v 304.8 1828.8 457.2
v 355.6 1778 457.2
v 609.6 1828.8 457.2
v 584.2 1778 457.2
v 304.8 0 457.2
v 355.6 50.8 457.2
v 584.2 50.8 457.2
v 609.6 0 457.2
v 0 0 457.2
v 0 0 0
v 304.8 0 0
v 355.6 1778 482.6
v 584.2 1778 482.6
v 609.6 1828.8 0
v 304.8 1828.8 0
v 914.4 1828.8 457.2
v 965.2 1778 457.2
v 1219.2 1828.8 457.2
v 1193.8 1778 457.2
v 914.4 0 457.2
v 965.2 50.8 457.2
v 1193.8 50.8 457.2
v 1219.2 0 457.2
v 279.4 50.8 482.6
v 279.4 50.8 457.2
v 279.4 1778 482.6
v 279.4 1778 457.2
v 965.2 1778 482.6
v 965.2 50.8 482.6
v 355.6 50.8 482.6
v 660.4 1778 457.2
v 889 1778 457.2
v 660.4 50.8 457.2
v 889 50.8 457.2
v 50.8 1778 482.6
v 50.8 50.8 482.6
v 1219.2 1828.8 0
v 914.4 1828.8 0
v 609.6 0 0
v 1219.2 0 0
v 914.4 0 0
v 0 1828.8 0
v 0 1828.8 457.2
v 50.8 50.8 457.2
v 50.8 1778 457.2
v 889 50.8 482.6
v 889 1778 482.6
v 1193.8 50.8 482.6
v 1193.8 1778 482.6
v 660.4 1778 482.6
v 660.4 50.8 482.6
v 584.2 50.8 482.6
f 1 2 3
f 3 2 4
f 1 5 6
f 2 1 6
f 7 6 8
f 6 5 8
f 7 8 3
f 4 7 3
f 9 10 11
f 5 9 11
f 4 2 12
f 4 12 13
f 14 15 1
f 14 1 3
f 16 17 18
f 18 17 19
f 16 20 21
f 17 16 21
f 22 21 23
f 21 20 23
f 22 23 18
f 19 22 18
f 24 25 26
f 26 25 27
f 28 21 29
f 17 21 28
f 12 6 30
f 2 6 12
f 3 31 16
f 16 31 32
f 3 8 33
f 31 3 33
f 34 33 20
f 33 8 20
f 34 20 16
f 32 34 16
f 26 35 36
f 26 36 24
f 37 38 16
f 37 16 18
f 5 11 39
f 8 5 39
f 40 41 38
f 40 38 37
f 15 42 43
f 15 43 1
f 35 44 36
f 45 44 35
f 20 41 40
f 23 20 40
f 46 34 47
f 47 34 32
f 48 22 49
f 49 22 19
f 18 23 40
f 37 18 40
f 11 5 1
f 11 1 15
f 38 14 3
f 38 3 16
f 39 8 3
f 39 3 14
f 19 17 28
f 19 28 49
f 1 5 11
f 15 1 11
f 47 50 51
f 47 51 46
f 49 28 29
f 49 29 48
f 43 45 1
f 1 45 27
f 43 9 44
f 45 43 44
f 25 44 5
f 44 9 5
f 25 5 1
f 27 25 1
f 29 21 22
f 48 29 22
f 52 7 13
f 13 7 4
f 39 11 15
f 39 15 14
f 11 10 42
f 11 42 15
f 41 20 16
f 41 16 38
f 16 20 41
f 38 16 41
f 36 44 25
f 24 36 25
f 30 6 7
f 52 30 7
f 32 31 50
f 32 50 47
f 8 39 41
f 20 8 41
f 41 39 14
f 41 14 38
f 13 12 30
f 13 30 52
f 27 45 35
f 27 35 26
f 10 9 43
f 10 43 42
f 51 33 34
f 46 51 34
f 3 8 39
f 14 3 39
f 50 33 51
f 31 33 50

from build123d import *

# Parameters (mm, degrees)
SKETCH1_W           = 304.8
SKETCH1_H           = 457.2
BOSS_EXTRUDE1_DEPTH = 1828.8
SKETCH2_W           = 228.6
SKETCH2_H           = 1727.2
BOSS_EXTRUDE2_DEPTH = 25.4
LPATTERN1_COUNT     = 4
LPATTERN1_PITCH     = 304.8


with BuildPart() as part:
    # Sketch1 → Boss-Extrude1 (new body)
    with BuildSketch(Plane(origin=(0, 0, 0), x_dir=(1, 0, 0), z_dir=(0, 1, 0))):
        with Locations((152.4, -228.6)):
            Rectangle(SKETCH1_W, SKETCH1_H)
    extrude(amount=BOSS_EXTRUDE1_DEPTH)

    # Sketch2 → Boss-Extrude2 (add)
    with BuildSketch(Plane.XY.offset(457.2)):
        with Locations((165.1, 914.4)):
            Rectangle(SKETCH2_W, SKETCH2_H)
    extrude(amount=BOSS_EXTRUDE2_DEPTH)


with BuildPart() as lpattern1_1:
    # LPattern1: pattern copy
    add(part.part.moved(Location(Vector(1, 0, 0) * (1 * LPATTERN1_PITCH))))


with BuildPart() as lpattern1_2:
    # LPattern1: pattern copy
    add(part.part.moved(Location(Vector(1, 0, 0) * (2 * LPATTERN1_PITCH))))


with BuildPart() as lpattern1_3:
    # LPattern1: pattern copy
    add(part.part.moved(Location(Vector(1, 0, 0) * (3 * LPATTERN1_PITCH))))


solid = Compound([part.part, lpattern1_1.part, lpattern1_2.part, lpattern1_3.part])
